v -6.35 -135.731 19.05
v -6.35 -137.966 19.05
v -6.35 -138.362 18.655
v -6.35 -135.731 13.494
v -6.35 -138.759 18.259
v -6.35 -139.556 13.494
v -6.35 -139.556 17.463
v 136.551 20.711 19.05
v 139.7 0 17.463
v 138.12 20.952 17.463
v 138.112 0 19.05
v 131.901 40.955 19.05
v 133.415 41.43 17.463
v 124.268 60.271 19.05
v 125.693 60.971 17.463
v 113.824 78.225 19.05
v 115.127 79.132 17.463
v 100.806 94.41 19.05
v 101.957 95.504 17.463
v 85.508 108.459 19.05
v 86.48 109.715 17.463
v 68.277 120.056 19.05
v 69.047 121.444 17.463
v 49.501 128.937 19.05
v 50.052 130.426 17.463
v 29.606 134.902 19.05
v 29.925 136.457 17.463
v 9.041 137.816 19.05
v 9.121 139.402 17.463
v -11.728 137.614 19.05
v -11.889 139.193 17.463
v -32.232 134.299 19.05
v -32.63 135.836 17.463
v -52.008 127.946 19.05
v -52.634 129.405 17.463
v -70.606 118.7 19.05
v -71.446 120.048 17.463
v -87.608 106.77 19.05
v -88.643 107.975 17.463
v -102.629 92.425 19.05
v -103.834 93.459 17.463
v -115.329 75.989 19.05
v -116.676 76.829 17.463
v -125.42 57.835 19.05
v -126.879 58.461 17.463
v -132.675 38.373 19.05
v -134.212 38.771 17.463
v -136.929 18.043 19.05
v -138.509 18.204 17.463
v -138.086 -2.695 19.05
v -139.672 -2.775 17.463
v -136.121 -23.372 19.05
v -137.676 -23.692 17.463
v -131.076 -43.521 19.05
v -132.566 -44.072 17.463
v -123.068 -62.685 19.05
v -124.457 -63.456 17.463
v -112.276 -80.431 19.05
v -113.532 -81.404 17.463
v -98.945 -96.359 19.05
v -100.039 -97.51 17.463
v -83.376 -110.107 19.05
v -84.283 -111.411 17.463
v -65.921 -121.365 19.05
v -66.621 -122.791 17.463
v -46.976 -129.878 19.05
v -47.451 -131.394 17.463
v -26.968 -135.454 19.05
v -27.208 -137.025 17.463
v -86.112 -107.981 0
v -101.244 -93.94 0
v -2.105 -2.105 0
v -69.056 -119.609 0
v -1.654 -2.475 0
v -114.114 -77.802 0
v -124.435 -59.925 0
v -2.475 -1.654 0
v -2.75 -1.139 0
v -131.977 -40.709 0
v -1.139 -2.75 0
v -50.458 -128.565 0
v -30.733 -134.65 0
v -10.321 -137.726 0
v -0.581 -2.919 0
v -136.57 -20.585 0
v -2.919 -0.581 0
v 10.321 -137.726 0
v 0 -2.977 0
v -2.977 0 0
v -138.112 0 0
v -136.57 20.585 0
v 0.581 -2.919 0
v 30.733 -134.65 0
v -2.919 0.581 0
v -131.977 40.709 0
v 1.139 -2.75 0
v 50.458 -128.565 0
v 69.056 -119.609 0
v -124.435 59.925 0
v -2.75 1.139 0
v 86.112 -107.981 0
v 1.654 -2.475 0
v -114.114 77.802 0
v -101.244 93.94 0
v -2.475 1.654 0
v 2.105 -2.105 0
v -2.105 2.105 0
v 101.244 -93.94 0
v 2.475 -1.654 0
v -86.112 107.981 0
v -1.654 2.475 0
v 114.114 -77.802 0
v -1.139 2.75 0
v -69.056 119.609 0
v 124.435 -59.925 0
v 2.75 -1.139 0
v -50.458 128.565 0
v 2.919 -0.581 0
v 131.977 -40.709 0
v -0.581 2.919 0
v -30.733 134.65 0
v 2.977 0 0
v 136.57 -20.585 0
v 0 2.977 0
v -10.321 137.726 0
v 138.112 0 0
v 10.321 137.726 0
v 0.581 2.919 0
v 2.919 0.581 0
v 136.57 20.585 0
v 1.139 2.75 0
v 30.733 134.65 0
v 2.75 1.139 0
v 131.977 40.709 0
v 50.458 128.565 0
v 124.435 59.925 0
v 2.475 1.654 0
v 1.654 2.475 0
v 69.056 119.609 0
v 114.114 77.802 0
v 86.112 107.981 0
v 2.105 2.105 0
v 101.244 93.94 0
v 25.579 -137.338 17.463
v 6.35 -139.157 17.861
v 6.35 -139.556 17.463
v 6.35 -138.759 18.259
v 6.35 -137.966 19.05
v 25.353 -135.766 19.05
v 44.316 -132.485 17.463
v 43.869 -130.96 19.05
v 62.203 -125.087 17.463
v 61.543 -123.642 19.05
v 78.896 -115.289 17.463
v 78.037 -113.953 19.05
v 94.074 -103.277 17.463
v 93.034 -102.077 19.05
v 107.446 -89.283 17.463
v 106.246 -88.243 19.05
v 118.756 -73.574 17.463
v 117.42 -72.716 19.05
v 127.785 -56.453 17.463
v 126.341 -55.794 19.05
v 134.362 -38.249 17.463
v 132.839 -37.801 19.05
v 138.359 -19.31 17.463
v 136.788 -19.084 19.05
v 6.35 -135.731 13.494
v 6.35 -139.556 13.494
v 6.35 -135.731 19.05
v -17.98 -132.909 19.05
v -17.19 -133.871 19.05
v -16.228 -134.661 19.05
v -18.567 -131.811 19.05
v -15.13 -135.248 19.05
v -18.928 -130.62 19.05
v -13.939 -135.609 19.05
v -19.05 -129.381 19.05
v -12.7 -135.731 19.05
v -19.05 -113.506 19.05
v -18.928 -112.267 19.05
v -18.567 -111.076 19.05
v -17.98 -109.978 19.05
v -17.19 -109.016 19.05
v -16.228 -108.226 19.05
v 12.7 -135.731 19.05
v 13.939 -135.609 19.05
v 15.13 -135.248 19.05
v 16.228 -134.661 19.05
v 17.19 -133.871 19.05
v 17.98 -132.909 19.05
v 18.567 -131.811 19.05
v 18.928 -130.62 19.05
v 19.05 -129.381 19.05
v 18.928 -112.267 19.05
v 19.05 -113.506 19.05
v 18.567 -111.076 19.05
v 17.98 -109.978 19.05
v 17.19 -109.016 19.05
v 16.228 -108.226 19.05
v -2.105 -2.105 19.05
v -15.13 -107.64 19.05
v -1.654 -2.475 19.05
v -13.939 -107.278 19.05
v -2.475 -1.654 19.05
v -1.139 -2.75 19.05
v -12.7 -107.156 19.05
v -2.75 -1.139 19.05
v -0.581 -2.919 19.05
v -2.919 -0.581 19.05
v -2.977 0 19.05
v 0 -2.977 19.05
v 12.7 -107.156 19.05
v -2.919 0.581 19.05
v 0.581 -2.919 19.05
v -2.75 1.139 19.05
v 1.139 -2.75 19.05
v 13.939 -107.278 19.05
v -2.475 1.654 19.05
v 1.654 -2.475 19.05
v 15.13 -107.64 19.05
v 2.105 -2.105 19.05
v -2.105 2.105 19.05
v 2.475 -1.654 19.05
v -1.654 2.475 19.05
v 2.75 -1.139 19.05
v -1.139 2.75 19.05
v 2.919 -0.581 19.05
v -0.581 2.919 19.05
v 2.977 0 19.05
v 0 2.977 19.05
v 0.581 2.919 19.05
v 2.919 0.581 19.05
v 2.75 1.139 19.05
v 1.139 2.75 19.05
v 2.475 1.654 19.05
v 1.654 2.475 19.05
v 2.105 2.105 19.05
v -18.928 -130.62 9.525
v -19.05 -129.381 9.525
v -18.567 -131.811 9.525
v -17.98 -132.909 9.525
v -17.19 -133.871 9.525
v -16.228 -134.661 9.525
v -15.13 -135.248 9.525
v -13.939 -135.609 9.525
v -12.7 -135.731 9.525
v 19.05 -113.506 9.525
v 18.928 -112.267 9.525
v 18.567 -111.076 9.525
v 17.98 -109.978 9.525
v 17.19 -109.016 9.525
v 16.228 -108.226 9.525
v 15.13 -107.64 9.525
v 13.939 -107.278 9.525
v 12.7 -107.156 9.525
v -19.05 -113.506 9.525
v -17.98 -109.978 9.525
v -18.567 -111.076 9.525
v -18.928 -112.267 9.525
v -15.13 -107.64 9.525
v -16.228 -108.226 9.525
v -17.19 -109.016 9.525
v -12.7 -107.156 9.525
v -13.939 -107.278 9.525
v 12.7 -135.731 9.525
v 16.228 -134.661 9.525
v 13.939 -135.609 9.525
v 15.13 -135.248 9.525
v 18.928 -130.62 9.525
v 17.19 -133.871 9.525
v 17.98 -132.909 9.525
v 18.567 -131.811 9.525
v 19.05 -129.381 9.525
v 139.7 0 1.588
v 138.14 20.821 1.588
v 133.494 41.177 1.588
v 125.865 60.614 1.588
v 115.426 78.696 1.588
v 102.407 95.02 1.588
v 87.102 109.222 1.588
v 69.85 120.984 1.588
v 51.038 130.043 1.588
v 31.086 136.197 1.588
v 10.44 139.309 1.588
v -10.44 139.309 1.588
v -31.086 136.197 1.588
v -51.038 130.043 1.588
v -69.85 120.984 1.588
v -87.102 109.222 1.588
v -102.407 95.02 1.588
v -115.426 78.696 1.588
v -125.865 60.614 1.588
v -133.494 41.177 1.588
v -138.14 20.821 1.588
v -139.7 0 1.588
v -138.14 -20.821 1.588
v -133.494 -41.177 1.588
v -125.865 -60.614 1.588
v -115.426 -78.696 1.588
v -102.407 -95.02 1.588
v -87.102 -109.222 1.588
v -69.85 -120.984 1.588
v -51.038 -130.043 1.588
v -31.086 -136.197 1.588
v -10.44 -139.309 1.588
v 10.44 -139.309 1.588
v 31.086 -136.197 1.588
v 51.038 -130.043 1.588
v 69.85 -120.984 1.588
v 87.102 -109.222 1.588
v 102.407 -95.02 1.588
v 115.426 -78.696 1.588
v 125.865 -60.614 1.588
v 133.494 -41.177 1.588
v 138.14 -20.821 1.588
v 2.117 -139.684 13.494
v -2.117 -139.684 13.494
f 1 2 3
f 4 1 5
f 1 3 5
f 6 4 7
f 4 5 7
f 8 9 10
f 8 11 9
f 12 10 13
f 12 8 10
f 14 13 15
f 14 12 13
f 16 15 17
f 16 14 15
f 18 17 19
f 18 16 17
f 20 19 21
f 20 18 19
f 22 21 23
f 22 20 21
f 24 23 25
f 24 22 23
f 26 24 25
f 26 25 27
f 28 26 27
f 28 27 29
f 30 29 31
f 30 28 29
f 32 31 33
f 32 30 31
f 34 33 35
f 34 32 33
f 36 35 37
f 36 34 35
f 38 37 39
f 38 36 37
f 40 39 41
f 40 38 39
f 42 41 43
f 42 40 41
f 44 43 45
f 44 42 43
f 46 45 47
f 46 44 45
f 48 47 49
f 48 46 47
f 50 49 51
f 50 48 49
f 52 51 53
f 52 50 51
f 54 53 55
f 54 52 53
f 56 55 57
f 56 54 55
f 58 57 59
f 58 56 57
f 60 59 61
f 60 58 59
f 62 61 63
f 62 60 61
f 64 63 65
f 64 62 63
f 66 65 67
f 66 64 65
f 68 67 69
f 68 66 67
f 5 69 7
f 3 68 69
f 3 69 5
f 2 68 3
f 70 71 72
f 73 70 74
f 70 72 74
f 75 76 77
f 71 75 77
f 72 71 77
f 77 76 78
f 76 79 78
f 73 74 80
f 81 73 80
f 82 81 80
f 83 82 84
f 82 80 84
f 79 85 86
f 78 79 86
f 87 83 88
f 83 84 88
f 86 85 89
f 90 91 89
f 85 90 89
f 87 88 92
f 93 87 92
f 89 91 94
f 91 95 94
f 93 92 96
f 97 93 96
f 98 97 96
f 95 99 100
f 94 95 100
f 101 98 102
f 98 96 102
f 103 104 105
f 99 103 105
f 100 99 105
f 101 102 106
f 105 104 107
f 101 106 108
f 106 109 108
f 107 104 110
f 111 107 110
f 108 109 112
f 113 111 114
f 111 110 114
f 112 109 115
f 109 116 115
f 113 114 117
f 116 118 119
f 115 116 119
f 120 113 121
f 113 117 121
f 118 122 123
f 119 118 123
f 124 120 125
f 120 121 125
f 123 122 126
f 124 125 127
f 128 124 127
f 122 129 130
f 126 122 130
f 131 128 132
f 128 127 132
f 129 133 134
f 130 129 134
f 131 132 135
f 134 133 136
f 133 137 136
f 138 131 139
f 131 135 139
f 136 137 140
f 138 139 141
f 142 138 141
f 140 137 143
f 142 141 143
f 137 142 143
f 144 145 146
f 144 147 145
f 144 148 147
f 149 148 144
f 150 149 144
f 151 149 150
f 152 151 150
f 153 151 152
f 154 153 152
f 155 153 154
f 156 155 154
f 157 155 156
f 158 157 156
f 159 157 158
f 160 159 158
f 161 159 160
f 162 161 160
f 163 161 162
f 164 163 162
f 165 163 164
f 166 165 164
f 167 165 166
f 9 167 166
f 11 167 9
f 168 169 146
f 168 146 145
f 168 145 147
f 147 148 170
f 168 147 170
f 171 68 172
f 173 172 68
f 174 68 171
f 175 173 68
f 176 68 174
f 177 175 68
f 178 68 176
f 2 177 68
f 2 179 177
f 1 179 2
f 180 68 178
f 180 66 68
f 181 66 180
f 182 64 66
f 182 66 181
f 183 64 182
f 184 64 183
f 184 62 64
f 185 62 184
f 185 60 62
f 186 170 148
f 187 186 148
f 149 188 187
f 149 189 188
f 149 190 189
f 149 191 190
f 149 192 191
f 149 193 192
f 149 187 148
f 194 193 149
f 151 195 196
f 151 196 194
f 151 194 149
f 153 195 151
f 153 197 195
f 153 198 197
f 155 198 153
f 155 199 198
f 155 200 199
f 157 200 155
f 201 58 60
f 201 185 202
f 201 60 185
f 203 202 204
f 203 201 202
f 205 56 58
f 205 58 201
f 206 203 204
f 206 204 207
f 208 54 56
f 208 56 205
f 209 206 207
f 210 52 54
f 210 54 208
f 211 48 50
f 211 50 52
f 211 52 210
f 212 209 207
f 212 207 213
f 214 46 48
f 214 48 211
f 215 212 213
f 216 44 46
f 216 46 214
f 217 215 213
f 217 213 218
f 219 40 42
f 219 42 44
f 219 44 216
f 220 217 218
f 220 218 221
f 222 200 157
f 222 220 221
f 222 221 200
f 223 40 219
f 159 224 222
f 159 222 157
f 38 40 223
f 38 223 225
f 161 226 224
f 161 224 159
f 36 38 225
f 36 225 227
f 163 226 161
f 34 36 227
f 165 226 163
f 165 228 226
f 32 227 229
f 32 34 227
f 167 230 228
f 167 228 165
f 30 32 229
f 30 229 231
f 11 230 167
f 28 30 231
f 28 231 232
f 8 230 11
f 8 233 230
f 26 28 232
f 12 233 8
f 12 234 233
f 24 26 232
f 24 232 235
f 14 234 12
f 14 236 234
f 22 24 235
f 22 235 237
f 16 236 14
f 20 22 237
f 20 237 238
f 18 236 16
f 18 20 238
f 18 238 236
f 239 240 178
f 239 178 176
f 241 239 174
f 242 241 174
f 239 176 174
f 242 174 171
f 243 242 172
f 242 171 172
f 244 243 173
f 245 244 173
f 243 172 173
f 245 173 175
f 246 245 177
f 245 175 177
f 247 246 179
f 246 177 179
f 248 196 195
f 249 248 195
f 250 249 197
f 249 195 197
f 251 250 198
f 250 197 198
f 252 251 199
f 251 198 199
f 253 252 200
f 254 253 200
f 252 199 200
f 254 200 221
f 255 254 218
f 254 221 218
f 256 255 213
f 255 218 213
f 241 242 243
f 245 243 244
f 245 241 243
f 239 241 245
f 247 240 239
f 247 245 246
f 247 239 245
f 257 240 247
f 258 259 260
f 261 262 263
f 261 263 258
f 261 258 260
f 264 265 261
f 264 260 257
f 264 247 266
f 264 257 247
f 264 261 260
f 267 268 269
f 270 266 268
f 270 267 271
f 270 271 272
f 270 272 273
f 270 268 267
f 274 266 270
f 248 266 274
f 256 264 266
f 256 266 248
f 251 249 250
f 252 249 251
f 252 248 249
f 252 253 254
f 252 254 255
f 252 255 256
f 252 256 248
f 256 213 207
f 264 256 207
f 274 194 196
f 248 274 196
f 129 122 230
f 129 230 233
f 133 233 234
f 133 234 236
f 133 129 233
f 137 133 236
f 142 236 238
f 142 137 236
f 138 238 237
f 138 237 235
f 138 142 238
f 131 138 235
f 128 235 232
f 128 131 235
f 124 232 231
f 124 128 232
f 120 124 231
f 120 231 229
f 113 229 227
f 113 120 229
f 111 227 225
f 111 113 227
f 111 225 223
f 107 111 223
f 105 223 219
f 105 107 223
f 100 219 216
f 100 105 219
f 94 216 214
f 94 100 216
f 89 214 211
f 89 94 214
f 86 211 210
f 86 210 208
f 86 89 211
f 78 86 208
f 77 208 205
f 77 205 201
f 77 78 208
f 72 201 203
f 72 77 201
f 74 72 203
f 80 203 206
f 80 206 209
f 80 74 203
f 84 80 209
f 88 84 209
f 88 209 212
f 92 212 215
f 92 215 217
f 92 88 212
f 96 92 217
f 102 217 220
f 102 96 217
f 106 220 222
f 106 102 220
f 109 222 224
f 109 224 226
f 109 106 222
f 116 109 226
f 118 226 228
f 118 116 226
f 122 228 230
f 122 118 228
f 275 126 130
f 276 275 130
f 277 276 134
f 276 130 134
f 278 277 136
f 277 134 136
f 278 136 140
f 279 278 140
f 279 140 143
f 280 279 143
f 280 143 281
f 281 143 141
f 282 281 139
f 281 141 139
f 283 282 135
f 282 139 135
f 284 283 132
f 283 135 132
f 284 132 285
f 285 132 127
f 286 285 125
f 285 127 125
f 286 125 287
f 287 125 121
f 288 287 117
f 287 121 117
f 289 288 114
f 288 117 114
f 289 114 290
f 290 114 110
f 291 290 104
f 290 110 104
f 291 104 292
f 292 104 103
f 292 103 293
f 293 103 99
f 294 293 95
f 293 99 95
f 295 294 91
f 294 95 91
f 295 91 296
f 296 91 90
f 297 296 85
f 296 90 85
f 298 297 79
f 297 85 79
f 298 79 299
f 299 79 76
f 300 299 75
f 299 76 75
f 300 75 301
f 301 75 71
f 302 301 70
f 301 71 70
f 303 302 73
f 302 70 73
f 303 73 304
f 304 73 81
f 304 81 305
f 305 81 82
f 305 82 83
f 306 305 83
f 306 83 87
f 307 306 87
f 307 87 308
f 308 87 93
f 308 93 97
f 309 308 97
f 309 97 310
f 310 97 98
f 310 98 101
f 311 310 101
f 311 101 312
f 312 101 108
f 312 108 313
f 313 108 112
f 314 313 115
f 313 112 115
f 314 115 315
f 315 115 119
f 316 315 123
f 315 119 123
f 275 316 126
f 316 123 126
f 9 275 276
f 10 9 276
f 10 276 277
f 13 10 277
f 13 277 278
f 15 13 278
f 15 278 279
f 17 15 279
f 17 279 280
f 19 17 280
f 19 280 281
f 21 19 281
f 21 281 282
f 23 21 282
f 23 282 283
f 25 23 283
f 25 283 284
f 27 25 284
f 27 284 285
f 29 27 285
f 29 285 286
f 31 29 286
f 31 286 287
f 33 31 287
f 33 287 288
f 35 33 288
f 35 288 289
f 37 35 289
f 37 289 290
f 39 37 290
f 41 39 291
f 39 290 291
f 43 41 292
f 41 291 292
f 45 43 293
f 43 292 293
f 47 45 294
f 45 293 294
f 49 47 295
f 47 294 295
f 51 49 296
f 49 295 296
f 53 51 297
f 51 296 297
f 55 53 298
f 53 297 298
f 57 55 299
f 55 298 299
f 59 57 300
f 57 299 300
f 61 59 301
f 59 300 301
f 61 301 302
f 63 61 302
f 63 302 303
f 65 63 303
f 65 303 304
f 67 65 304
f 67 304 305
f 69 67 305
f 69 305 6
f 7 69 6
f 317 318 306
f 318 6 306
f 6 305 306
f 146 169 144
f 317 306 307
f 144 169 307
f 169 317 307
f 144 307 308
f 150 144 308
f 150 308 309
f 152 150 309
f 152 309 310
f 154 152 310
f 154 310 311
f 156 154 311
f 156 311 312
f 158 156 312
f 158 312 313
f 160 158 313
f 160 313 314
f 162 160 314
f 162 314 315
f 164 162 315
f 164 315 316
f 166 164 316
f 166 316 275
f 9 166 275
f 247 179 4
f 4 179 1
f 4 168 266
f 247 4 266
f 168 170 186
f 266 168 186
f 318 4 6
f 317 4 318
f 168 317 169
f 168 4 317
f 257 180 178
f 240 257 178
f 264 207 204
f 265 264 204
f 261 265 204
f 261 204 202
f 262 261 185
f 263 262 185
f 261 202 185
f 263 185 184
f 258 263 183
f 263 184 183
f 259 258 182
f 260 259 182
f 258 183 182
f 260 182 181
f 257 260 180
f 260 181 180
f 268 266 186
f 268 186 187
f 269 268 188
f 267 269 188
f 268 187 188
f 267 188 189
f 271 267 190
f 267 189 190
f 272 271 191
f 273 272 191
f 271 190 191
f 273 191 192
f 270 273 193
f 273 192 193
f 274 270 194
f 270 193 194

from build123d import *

# Parameters (mm, degrees)
F2_R     = 139.7
F2_R_2   = 2.9765625
F3_DEPTH = 19.05
F4_SIZE  = 1.5875
F6_DEPTH = 5.55625
F8_DEPTH = 9.525


# Not quite as in the source:
# - a variable given as a bare number and used for a length is read in inches; the dataset says mm whatever the document's units were


with BuildPart() as f3:
    # F2 (on Top) → F3 (new body)
    with BuildSketch(Plane.XY):
        Circle(F2_R)
        Circle(F2_R_2, mode=Mode.SUBTRACT)
    extrude(amount=F3_DEPTH)

    # F4
    f4_edges = [f3.edges().sort_by_distance(p)[0] for p in [
        (-139.7, 0, 19.05),
        (-139.7, 0, 0),
    ]]
    chamfer(f4_edges, length=F4_SIZE)

    # F5 (on face) → F6 (cut)
    with BuildSketch(Plane.XY.offset(19.05)):
        with BuildLine():
            Line((6.35, -137.9664457622), (6.35, -114.2999987969))
            ThreePointArc((6.35, -114.2999987969), (-6.016e-07, -107.95), (-6.35, -114.3))
            Line((-6.35, -114.3), (-6.35, -137.9664457622))
            ThreePointArc((-6.35, -137.9664457622), (0, -138.1125), (6.35, -137.9664457622))
        make_face()
        with BuildLine():
            Line((6.35, -143.818885088), (6.35, -137.9664457622))
            ThreePointArc((6.35, -137.9664457622), (0, -138.1125), (-6.35, -137.9664457622))
            Line((-6.35, -137.9664457622), (-6.35, -143.818885088))
            Line((-6.35, -143.818885088), (6.35, -143.818885088))
        make_face()
    extrude(amount=-F6_DEPTH, mode=Mode.SUBTRACT)

    # F7 (on face) → F8 (cut)
    with BuildSketch(Plane.XY.offset(19.05)):
        with BuildLine():
            Line((12.7, -107.15625), (-12.7, -107.15625))
            ThreePointArc((-12.7, -107.15625), (-17.1901280605, -109.0161219395), (-19.05, -113.50625))
            Line((-19.05, -113.50625), (-19.05, -129.38125))
            ThreePointArc((-19.05, -129.38125), (-17.1901280605, -133.8713780605), (-12.7, -135.73125))
            Line((-12.7, -135.73125), (-6.35, -135.73125))
            Line((-6.35, -135.73125), (-6.35, -114.3))
            ThreePointArc((-6.35, -114.3), (-6.016e-07, -107.95), (6.35, -114.2999987969))
            Line((6.35, -114.2999987969), (6.35, -135.73125))
            Line((6.35, -135.73125), (12.7, -135.73125))
            ThreePointArc((12.7, -135.73125), (17.1901280605, -133.8713780605), (19.05, -129.38125))
            Line((19.05, -129.38125), (19.05, -113.50625))
            ThreePointArc((19.05, -113.50625), (17.1901280605, -109.0161219395), (12.7, -107.15625))
        make_face()
        with BuildLine():
            Line((-6.35, -114.3), (-6.35, -135.73125))
            Line((-6.35, -135.73125), (6.35, -135.73125))
            Line((6.35, -135.73125), (6.35, -114.2999987969))
            ThreePointArc((6.35, -114.2999987969), (-6.016e-07, -107.95), (-6.35, -114.3))
        make_face()
    extrude(amount=-F8_DEPTH, mode=Mode.SUBTRACT)


solid = f3.part
